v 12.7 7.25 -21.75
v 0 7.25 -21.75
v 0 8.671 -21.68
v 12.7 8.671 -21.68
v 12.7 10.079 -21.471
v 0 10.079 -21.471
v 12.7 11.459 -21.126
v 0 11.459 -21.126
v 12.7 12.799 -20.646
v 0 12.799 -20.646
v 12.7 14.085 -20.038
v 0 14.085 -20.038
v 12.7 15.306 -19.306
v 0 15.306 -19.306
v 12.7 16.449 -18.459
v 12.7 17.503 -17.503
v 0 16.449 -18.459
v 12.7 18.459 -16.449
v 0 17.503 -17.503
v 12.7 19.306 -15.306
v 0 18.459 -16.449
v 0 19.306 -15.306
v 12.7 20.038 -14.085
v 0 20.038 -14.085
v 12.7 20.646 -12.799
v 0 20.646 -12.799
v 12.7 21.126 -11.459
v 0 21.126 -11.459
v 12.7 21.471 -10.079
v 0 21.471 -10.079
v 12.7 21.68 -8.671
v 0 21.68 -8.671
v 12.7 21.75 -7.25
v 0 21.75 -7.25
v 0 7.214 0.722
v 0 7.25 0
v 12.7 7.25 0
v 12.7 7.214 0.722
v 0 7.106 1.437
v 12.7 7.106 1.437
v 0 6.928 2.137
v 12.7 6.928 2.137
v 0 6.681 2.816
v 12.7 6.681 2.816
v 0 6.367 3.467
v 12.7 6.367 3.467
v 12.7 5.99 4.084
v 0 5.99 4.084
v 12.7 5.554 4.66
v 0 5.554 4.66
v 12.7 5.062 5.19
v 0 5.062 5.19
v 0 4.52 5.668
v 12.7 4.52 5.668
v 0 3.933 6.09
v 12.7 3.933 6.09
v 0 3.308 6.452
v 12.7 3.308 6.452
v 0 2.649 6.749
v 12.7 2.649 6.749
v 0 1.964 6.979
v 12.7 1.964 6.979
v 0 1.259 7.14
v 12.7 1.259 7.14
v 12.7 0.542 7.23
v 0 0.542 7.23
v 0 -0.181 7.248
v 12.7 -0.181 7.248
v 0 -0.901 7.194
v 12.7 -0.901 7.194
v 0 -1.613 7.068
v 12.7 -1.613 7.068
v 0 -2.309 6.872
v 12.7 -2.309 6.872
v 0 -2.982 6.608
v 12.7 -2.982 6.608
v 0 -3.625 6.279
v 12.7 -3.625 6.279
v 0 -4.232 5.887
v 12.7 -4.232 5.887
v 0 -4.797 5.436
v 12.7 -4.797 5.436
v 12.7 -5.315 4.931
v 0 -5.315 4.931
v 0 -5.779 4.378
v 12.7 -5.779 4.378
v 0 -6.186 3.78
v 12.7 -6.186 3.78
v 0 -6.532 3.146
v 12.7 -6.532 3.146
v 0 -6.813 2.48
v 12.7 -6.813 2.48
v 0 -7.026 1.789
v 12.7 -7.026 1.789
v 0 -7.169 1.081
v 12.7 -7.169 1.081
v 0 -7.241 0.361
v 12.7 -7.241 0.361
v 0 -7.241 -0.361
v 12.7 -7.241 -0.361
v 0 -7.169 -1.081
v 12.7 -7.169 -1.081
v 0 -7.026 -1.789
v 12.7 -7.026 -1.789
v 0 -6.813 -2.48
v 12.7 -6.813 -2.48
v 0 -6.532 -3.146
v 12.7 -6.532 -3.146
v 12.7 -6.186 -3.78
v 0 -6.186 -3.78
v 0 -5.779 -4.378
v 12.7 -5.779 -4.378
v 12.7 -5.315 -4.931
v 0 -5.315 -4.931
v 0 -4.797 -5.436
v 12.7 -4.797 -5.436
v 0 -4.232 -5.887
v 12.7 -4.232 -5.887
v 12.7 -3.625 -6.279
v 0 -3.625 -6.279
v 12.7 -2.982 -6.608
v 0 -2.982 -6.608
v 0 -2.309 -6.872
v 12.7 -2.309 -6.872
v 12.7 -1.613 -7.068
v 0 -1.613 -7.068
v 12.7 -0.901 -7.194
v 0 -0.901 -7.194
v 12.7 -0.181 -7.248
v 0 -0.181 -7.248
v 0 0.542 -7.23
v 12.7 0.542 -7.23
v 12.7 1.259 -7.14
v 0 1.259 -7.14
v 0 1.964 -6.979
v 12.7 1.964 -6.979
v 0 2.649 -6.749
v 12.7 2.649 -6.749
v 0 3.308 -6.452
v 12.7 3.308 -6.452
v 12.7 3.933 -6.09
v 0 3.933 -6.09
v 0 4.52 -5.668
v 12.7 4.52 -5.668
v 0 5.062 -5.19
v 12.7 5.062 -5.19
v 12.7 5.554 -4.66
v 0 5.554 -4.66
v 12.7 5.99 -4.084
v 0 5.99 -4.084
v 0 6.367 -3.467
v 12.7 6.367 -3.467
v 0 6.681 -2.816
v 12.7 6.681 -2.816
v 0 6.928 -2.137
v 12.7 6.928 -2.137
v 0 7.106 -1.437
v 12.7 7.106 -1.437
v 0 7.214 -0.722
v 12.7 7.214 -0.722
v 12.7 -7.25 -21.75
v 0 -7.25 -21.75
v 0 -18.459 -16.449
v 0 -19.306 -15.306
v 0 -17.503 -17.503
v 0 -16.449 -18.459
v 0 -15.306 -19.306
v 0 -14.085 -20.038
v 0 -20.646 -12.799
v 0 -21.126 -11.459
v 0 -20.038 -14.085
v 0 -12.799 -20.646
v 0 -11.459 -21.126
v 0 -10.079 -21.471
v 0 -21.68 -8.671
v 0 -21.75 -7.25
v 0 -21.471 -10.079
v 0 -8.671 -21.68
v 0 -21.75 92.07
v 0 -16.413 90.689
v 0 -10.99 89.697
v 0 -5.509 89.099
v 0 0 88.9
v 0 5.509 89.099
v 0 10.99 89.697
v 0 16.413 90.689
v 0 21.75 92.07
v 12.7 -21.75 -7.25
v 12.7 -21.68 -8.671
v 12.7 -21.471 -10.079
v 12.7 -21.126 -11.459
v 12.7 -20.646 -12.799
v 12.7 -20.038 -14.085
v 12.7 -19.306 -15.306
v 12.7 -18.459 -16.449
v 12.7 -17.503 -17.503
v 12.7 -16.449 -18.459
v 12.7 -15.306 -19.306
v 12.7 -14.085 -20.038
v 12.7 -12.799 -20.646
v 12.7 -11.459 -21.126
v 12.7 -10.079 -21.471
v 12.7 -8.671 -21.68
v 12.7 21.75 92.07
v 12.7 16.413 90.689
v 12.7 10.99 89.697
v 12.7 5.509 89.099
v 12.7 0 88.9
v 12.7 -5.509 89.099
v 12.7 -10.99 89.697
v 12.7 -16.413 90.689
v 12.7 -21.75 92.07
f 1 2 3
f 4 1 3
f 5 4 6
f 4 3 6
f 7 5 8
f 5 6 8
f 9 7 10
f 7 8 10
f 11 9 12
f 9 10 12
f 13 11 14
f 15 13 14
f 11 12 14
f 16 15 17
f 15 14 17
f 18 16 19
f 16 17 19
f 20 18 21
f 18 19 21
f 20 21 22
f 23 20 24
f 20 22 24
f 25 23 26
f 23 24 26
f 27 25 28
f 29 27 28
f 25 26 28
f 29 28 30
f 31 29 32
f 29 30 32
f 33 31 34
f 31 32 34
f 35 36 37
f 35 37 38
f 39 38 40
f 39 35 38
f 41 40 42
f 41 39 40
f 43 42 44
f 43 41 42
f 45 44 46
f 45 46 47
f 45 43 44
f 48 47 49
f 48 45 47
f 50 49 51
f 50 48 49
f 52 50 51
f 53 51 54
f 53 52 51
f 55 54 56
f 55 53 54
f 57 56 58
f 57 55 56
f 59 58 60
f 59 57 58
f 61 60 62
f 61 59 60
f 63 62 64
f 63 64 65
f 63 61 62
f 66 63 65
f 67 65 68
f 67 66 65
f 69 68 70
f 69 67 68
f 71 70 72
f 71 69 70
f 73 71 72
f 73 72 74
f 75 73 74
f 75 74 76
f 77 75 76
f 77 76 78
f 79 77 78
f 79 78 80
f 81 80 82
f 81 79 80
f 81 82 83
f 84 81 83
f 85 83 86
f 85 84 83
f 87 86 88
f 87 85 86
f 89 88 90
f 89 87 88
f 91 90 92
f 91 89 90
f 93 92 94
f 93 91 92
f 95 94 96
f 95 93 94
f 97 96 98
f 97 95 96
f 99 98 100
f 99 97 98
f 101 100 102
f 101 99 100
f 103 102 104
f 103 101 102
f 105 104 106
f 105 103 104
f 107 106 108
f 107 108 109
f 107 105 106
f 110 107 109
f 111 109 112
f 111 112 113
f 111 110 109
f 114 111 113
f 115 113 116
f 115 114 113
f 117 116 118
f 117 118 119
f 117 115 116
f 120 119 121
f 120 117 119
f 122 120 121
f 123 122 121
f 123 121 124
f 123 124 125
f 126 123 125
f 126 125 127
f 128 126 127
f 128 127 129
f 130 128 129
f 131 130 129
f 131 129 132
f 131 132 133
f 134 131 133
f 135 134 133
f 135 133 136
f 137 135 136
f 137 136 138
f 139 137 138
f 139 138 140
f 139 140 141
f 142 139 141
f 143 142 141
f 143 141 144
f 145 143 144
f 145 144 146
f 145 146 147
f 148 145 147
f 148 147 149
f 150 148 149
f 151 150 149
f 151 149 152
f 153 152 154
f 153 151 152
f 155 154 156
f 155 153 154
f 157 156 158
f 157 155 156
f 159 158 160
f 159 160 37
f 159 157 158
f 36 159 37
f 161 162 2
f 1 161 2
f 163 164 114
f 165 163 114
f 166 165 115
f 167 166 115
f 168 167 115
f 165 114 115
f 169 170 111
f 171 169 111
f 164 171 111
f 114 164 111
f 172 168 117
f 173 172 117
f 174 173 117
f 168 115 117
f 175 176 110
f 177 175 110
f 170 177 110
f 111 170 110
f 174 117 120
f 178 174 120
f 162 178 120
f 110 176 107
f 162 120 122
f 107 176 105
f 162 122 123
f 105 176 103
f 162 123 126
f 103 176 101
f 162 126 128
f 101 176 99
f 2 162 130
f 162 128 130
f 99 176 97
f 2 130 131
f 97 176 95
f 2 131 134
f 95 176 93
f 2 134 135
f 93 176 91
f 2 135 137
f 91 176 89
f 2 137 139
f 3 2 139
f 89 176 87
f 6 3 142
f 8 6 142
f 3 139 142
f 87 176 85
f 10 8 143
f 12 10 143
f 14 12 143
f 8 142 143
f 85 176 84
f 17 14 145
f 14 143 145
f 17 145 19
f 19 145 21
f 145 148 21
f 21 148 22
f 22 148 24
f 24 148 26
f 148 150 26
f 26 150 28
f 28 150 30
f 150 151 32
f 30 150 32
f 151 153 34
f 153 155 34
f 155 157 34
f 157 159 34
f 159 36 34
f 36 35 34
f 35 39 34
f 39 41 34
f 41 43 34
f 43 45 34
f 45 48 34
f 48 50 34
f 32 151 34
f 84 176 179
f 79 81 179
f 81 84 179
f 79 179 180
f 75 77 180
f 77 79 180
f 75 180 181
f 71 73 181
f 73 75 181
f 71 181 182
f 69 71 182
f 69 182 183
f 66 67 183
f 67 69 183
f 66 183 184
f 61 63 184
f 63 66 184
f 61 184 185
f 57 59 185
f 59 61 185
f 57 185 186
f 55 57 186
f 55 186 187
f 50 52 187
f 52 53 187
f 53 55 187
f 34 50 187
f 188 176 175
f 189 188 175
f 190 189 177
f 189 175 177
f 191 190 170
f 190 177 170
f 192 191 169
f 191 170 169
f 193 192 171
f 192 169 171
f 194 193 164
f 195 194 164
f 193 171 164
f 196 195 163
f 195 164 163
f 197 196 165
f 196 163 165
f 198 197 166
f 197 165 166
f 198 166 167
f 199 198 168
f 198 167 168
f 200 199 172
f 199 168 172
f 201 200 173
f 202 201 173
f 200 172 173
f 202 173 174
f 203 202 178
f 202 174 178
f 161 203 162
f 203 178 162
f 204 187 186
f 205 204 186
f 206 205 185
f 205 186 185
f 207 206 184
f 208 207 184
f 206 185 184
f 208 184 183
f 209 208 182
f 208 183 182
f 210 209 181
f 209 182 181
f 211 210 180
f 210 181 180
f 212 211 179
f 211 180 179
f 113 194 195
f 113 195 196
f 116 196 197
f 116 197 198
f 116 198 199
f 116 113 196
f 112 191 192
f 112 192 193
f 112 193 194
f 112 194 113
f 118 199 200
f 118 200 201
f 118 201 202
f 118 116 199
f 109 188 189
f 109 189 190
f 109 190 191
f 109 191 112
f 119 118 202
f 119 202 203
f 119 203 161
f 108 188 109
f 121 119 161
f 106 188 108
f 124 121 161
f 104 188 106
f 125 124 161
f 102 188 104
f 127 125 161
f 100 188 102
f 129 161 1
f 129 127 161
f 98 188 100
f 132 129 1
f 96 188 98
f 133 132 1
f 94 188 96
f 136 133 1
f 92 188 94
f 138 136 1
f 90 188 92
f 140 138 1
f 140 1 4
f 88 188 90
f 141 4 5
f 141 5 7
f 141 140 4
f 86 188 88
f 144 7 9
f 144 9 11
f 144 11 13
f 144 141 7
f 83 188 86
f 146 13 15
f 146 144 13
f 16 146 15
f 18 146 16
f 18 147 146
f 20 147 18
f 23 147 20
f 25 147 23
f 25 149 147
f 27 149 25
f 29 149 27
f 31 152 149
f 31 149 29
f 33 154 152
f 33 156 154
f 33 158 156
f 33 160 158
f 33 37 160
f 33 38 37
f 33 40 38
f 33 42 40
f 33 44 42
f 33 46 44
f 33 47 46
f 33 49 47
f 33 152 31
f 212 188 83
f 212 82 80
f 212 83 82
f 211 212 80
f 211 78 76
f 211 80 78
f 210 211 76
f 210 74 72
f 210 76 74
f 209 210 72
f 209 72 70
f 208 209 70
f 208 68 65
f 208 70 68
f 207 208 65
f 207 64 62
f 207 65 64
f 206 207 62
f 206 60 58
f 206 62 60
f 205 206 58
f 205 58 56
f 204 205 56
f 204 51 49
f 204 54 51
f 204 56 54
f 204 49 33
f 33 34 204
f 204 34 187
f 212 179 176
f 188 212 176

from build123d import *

# Parameters (mm, degrees)
F0_R     = 7.25
F1_DEPTH = 12.7


with BuildPart() as f1:
    # F0 (on Right) → F1 (new body)
    with BuildSketch(Plane.YZ):
        with BuildLine():
            ThreePointArc((-21.75, -7.25), (-17.503048, -17.503048), (-7.25, -21.75))
            Line((-7.25, -21.75), (7.25, -21.75))
            ThreePointArc((7.25, -21.75), (17.503048, -17.503048), (21.75, -7.25))
            Line((21.75, -7.25), (21.75, 92.070023))
            ThreePointArc((21.75, 92.070023), (0, 88.9), (-21.75, 92.070023))
            Line((-21.75, 92.070023), (-21.75, -7.25))
        make_face()
        Circle(F0_R, mode=Mode.SUBTRACT)
    extrude(amount=F1_DEPTH)


solid = f1.part
